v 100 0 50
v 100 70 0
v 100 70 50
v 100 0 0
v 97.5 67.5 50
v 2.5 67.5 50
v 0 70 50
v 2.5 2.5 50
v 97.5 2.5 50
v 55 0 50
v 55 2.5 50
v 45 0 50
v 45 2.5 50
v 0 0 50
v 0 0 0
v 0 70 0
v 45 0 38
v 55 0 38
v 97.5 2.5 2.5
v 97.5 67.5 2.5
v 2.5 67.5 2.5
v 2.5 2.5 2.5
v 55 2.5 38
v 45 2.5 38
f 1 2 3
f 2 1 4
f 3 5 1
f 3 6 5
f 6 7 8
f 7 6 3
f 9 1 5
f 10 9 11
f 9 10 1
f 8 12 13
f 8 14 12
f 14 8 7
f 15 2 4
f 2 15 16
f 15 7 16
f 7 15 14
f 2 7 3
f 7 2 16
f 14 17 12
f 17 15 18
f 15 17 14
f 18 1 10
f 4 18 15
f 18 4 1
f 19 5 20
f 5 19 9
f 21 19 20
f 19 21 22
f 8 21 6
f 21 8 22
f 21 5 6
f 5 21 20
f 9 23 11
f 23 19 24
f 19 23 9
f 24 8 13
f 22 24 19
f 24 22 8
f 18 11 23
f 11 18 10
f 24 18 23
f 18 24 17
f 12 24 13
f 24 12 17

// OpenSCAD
$fn = 32;

// ----------------------------------------------------------------------
// Enclosure box: notch enclosure
// ----------------------------------------------------------------------

// --- parameters (mm) ---
box_l = 100;              // outer length, X
box_w = 70;               // outer width, Y
box_h = 50;               // outer height
wall_t = 2.5;             // wall thickness
notch_w = 10;             // cable notch width
notch_h = 12;             // cable notch height

inner_h = box_h - wall_t;  // cavity depth
boss_h = inner_h - 2;  // corner boss height

difference() {
  cube([box_l, box_w, box_h]);
  translate([wall_t, wall_t, wall_t])
    cube([box_l - 2 * wall_t, box_w - 2 * wall_t, box_h]);
  translate([box_l / 2 - notch_w / 2, -1, box_h - notch_h])
    cube([notch_w, wall_t + 2, notch_h + 1]);
}
